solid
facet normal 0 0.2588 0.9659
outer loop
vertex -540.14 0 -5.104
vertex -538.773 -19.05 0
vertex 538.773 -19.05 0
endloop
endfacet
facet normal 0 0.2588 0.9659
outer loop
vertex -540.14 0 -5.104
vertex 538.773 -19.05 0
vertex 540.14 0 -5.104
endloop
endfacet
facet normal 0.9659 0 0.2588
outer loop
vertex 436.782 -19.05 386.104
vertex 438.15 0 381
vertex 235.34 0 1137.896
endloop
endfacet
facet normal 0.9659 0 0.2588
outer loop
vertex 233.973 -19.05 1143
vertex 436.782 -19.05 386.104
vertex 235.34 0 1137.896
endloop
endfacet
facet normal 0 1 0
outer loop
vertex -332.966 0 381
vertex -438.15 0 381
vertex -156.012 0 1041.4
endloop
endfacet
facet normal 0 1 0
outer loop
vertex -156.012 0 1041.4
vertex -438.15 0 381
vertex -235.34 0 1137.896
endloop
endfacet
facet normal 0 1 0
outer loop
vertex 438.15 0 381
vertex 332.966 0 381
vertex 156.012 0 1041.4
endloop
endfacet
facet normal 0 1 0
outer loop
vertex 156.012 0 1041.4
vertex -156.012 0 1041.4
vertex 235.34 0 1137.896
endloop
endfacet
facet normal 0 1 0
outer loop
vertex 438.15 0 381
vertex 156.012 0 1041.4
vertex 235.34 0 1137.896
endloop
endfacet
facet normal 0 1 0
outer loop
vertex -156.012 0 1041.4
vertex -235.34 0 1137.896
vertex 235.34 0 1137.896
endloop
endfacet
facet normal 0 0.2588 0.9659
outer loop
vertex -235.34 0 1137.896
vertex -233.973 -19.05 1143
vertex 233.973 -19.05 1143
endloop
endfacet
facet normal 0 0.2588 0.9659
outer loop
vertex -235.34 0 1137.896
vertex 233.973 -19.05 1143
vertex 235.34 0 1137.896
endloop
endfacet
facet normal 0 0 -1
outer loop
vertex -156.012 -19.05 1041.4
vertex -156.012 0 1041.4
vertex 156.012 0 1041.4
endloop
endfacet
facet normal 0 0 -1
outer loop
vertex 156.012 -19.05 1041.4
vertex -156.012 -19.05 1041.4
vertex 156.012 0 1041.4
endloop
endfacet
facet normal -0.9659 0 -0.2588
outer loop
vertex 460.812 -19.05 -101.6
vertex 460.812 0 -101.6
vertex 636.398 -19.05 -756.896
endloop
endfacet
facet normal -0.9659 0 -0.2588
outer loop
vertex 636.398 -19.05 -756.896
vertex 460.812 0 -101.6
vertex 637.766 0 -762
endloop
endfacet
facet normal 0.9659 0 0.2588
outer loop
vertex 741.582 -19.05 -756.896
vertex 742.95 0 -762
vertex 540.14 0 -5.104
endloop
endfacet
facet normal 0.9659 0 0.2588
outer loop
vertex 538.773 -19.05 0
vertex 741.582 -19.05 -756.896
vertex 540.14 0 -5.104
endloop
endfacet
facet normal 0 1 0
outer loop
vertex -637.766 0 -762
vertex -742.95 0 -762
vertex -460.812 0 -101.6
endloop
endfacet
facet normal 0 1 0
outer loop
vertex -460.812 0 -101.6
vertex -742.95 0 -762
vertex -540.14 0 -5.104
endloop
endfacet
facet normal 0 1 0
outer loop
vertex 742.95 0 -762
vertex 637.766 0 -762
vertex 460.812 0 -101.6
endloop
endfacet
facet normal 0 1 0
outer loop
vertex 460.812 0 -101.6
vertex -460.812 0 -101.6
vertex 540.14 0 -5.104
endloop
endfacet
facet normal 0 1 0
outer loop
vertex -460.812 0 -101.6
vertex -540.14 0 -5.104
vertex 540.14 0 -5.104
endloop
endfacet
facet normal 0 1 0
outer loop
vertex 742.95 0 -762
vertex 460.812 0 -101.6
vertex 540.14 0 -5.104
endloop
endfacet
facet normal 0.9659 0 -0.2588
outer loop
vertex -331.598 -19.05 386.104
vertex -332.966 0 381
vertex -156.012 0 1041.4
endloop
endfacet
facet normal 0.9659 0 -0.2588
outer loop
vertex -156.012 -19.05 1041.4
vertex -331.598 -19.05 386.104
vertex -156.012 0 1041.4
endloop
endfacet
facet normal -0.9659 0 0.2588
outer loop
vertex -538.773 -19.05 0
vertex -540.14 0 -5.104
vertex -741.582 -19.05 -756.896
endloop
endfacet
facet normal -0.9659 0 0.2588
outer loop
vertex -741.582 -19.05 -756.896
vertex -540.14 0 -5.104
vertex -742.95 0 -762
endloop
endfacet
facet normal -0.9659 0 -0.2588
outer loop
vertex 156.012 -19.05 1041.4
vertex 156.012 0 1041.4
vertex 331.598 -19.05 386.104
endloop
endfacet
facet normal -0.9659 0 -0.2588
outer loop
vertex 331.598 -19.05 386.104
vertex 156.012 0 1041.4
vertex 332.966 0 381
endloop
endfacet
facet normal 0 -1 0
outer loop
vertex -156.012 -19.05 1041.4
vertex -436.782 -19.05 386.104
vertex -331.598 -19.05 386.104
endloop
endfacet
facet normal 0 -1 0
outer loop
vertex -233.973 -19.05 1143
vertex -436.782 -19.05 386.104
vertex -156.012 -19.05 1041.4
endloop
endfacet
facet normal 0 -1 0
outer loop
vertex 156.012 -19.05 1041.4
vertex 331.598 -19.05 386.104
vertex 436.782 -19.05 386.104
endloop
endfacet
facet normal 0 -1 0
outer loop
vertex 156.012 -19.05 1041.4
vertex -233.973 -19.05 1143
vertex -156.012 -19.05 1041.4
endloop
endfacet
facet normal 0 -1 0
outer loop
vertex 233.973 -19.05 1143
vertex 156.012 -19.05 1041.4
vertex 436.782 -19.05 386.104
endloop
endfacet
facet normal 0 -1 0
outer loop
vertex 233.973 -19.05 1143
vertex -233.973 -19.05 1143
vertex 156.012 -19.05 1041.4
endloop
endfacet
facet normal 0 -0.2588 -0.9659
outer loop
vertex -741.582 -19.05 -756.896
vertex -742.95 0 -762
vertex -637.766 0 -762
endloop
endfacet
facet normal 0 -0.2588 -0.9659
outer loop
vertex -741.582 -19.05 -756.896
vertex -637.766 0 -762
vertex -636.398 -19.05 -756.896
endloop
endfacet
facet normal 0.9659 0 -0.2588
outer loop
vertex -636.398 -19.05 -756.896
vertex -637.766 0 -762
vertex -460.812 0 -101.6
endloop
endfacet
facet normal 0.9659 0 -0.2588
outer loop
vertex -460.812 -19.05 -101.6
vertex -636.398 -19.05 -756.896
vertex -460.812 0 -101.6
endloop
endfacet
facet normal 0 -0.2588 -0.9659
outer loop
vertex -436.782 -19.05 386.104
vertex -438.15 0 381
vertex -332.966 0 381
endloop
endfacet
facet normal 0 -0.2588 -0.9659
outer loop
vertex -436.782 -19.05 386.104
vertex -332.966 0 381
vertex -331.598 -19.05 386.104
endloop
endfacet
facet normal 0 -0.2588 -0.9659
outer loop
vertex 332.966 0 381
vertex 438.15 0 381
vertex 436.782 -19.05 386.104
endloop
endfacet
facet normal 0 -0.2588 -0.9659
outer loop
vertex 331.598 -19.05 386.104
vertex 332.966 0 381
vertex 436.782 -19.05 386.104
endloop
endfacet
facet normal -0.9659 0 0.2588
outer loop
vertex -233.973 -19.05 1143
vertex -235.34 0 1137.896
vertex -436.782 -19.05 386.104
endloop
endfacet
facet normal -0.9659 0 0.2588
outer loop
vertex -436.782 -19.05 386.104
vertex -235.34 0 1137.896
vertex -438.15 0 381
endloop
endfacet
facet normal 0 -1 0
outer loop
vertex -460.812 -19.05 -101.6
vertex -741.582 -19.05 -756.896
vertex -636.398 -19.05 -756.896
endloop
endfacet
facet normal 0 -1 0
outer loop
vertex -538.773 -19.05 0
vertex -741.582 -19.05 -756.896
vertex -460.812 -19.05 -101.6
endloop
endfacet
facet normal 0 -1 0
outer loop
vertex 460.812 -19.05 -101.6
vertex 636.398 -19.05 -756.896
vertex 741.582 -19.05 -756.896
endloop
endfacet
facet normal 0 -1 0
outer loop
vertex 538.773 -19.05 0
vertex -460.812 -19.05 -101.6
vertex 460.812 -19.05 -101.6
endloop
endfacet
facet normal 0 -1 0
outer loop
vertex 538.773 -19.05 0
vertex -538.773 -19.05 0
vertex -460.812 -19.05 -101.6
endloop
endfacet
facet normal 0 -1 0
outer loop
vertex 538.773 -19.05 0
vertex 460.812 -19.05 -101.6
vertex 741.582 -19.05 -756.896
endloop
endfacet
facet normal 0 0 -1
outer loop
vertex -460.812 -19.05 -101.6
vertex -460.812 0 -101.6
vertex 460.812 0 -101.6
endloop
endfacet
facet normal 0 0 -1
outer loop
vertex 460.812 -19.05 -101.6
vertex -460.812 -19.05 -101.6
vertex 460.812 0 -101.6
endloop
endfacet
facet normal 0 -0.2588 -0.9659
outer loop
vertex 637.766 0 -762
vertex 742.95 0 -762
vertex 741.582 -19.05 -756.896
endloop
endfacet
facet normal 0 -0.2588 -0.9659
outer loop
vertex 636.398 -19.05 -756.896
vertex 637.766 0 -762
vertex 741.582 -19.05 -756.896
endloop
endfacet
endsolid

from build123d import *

# Parameters (mm, degrees)
F1_DEPTH = 19.05
F3_DEPTH = 19.05
F5_DEPTH = 762


with BuildPart() as f1:
    # F0 (on Front) → F1 (new body)
    with BuildSketch(Plane.XZ):
        Polygon((-538.772715, 0), (-742.95, -762), (-637.76594, -762), (-460.812293, -101.6), (0, -101.6), (460.812293, -101.6), (637.76594, -762), (742.95, -762), (538.772715, 0), (0, 0), align=None)
    extrude(amount=F1_DEPTH)


with BuildPart() as f3:
    # F2 (on Front) → F3 (new body)
    with BuildSketch(Plane.XZ):
        Polygon((-156.012293, 1041.4), (0, 1041.4), (156.012293, 1041.4), (332.96594, 381), (438.15, 381), (233.972715, 1143), (0, 1143), (-233.972715, 1143), (-438.15, 381), (-332.96594, 381), align=None)
    extrude(amount=F3_DEPTH)


with BuildPart() as f5_tool:
    # F4 (on Right) → F5 (new body, symmetric)
    with BuildSketch(Plane.YZ):
        Polygon((-19.05, -756.895568), (-19.05, -762), (0, -762), align=None)
        Polygon((0, -5.104432), (0, 0), (-19.05, 0), align=None)
        Polygon((-19.05, 381), (0, 381), (-19.05, 386.104432), align=None)
        Polygon((0, 1143), (-19.05, 1143), (0, 1137.895568), align=None)
    extrude(amount=F5_DEPTH, both=True)


with BuildPart() as f1_1:
    add(f1.part)

    # F5: cut by f5_tool
    add(f5_tool.part, mode=Mode.SUBTRACT)


with BuildPart() as f3_1:
    add(f3.part)

    # F5: cut by f5_tool
    add(f5_tool.part, mode=Mode.SUBTRACT)


solid = Compound([f1_1.part, f3_1.part])
